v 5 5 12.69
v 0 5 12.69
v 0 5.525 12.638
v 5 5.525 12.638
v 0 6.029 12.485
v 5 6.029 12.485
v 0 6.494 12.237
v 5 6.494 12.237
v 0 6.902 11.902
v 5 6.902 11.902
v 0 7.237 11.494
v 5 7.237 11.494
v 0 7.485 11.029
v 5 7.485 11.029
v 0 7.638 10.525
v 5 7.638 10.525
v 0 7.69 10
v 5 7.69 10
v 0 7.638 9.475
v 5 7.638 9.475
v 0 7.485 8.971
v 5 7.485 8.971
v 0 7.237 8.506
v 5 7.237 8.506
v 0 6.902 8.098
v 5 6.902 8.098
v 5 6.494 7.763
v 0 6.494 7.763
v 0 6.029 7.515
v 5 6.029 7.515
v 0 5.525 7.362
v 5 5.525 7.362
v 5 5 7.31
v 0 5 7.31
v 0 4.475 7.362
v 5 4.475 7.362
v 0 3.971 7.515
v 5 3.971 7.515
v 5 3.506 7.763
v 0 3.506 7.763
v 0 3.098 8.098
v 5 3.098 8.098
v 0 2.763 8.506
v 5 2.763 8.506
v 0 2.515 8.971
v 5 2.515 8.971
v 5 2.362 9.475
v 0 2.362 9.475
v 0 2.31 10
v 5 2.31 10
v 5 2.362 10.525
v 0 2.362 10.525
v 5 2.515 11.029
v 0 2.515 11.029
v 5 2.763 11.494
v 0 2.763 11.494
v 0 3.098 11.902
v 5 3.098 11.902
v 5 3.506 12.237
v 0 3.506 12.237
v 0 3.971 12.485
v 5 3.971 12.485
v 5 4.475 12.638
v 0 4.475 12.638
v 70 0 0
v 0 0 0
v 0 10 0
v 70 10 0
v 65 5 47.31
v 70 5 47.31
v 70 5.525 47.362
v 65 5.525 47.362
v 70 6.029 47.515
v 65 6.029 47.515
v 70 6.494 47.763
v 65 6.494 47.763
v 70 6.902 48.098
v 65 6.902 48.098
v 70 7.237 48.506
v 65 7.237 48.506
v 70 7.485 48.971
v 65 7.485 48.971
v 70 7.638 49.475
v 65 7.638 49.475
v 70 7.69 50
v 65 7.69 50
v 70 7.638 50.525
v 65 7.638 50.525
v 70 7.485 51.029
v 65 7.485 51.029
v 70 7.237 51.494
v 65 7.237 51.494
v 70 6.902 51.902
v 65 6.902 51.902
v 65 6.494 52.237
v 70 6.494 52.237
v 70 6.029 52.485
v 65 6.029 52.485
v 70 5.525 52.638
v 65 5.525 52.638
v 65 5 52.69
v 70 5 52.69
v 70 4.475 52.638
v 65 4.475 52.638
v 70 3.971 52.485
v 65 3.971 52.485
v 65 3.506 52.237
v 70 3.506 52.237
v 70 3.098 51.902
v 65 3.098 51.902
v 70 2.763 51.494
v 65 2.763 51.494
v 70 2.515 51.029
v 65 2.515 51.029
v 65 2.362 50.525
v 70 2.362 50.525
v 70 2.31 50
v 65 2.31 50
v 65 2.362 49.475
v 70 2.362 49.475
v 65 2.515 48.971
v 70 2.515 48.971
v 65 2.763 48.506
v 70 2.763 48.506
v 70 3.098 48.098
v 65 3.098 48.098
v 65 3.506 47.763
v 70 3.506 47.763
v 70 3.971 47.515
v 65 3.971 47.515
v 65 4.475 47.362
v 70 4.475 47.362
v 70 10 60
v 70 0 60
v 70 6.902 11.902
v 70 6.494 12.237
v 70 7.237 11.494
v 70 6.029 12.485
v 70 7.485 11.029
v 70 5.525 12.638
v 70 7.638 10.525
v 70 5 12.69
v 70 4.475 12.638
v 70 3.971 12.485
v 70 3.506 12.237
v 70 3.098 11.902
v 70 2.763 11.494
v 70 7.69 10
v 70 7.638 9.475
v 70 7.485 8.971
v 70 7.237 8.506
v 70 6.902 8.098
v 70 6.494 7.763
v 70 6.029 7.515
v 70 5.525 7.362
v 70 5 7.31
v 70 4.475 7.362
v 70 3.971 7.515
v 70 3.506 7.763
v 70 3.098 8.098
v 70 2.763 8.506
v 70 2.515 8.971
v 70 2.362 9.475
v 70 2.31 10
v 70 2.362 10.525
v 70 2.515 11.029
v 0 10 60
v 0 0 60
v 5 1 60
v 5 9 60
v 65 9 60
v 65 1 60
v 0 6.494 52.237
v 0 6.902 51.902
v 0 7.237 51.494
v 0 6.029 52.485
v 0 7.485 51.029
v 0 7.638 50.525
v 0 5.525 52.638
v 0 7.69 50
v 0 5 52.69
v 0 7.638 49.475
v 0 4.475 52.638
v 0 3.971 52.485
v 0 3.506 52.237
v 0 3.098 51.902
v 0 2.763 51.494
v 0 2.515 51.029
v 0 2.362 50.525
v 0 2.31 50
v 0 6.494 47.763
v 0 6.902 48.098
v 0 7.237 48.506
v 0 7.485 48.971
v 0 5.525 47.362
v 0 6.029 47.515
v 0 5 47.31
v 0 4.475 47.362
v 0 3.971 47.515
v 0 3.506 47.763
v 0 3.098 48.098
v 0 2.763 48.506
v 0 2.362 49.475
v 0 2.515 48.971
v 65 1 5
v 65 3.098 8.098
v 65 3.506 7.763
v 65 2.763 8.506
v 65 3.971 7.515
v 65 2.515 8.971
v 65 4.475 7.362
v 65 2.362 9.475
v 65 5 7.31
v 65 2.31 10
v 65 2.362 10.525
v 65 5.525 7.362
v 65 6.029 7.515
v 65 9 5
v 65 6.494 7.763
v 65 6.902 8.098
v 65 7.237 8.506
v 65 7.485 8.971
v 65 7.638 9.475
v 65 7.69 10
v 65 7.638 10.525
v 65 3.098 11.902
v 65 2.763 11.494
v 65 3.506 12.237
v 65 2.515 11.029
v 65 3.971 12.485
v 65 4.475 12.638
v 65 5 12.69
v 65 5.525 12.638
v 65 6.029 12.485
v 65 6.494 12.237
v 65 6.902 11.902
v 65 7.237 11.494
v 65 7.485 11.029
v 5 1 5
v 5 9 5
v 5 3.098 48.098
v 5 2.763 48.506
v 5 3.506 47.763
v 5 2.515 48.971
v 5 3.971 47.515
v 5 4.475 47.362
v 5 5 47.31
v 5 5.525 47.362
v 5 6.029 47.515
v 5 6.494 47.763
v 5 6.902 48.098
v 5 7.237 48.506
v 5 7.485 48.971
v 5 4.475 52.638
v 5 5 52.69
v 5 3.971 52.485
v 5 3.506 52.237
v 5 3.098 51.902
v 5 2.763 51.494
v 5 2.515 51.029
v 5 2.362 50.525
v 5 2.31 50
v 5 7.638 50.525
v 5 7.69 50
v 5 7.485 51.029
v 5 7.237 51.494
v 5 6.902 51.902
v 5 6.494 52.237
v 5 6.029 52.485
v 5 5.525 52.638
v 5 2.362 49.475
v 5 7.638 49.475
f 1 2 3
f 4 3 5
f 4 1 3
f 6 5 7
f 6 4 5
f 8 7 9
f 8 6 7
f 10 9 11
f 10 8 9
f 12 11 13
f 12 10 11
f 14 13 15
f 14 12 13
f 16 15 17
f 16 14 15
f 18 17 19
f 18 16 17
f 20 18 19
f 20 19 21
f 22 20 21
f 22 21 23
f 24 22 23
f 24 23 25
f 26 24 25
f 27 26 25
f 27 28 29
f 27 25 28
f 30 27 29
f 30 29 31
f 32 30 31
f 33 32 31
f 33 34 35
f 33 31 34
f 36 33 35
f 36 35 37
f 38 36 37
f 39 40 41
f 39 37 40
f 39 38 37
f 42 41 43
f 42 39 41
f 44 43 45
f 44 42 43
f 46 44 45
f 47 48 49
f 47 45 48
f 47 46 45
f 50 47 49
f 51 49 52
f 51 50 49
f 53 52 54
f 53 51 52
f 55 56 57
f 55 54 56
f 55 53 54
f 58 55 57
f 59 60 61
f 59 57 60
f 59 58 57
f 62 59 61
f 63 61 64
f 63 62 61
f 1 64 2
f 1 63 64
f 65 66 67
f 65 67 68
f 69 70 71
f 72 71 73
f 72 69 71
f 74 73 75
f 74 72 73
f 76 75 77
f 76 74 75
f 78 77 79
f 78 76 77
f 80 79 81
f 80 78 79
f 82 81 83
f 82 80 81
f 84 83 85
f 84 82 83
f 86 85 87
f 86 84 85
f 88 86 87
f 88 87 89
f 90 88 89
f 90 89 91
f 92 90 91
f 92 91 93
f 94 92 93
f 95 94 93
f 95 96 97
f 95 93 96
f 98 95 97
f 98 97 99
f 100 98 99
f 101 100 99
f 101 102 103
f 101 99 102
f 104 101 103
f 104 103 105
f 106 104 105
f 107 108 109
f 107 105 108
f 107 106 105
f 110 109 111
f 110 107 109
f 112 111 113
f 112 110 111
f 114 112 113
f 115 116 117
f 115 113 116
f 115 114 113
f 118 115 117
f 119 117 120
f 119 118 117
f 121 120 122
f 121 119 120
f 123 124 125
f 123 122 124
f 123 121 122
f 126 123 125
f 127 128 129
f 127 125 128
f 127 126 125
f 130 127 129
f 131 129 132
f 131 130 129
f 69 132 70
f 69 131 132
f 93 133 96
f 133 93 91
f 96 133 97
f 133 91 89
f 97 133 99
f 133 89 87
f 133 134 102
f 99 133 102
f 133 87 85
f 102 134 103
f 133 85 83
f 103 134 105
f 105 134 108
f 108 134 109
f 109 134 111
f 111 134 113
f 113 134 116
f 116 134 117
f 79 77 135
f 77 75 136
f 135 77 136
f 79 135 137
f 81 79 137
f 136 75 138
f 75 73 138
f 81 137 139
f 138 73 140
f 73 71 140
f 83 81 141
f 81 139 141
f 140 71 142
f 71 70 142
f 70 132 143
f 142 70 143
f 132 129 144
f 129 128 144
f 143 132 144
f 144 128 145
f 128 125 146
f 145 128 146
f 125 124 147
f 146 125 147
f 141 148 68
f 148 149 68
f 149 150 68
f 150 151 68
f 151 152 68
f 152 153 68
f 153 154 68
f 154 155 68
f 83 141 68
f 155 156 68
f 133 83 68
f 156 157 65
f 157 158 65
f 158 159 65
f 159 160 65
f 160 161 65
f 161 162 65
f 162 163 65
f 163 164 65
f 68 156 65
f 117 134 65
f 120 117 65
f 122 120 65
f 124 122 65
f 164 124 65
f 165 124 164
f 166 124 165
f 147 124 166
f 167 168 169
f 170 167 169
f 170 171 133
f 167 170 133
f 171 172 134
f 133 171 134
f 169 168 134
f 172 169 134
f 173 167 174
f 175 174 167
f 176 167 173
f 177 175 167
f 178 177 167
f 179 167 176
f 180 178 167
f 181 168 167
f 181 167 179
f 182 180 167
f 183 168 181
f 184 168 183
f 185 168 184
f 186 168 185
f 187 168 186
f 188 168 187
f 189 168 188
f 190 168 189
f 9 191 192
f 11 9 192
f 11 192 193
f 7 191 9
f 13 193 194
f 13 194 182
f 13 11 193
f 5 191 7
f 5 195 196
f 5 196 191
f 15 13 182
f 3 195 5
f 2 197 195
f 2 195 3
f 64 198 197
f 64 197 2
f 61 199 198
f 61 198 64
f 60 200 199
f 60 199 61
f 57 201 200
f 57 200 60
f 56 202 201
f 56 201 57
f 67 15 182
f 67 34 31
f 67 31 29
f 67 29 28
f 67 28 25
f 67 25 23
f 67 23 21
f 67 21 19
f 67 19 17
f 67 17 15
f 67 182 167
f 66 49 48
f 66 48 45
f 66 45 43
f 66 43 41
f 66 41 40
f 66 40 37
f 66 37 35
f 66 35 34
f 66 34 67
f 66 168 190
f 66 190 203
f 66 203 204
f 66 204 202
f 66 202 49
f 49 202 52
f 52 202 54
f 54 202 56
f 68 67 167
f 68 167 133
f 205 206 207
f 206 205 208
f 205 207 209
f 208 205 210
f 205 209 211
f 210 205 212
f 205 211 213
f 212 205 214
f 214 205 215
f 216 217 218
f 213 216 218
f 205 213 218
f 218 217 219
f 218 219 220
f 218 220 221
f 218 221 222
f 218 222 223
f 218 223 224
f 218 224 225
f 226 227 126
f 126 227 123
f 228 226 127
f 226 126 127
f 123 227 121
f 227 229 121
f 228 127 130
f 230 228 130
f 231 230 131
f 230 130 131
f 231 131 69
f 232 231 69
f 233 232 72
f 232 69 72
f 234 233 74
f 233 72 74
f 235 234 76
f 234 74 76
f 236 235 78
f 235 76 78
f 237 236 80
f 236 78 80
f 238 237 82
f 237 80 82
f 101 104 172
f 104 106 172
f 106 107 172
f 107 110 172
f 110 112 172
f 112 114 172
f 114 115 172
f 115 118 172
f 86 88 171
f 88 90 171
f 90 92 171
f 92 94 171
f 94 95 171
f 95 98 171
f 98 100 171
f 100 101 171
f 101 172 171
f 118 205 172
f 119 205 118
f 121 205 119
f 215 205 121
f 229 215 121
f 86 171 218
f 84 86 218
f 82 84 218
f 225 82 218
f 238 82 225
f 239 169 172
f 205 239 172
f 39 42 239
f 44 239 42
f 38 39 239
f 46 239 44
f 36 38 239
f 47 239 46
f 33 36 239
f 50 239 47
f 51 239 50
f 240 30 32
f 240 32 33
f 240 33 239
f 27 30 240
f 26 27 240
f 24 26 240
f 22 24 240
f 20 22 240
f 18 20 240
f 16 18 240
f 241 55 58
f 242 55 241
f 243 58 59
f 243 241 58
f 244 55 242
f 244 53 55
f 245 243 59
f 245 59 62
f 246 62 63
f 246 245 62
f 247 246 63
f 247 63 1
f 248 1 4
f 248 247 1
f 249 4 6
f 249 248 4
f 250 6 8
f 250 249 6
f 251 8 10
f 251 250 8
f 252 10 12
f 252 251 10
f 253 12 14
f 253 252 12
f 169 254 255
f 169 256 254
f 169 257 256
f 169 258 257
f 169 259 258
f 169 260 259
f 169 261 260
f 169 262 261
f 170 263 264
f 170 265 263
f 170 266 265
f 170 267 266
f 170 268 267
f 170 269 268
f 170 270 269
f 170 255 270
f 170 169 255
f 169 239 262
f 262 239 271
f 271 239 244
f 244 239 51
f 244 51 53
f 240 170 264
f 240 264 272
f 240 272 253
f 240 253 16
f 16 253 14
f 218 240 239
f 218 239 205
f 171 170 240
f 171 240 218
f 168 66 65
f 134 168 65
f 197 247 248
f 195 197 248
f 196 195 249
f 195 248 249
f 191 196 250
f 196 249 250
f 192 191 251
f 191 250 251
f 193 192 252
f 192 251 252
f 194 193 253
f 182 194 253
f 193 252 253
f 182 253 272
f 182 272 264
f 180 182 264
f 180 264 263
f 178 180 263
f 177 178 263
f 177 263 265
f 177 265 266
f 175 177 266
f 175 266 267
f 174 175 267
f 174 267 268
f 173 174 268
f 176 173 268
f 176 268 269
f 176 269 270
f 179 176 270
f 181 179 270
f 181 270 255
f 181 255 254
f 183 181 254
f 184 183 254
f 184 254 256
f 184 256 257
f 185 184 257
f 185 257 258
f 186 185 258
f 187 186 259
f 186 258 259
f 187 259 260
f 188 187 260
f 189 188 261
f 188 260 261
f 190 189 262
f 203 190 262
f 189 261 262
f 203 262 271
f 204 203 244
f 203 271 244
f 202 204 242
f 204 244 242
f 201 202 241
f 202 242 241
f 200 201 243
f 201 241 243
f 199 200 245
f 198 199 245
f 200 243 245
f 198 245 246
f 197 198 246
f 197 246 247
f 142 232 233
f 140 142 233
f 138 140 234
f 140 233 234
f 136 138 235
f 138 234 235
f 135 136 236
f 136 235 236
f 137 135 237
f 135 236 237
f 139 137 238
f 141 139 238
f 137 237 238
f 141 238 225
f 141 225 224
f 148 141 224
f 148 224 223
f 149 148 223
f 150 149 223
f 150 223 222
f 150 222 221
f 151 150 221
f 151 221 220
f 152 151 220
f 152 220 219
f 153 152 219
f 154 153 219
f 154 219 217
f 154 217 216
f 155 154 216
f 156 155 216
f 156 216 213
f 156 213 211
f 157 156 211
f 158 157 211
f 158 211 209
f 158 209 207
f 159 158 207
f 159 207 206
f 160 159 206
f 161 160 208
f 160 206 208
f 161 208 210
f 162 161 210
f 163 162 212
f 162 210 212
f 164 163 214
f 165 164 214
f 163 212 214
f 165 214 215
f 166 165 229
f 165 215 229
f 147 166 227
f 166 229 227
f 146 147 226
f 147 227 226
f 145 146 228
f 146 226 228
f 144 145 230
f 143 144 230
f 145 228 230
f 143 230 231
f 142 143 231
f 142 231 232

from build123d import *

# Parameters (mm, degrees)
SKETCH1_W               = 70
SKETCH1_H               = 60
BOSS_EXTRUDE1_DEPTH     = 10
SKETCH2_W               = 60
SKETCH2_H               = 8
CUT_EXTRUDE1_DEPTH      = 55
SKETCH3_R               = 2.68983582
CUT_EXTRUDE2_DEPTH      = 55
MIRROR2_COPY_1_SKETCH_R = 2.68983582
MIRROR2_COPY_1_DEPTH    = 55


with BuildPart() as part:
    # Sketch1 → Boss-Extrude1 (new body)
    with BuildSketch(Plane(origin=(0, 0, 0), x_dir=(1, 0, 0), z_dir=(0, 1, 0))):
        with Locations((35, -30)):
            Rectangle(SKETCH1_W, SKETCH1_H)
    extrude(amount=BOSS_EXTRUDE1_DEPTH)

    # Sketch2 → Cut-Extrude1 (cut)
    with BuildSketch(Plane.XY.offset(60)):
        with Locations((35, 5)):
            Rectangle(SKETCH2_W, SKETCH2_H)
    extrude(amount=-CUT_EXTRUDE1_DEPTH, mode=Mode.SUBTRACT)

    # Sketch3 → Cut-Extrude2 (cut)
    with BuildSketch(Plane.ZY.offset(-65)):
        with Locations((10, 5)):
            Circle(SKETCH3_R)
    cut_extrude2 = extrude(amount=-CUT_EXTRUDE2_DEPTH, mode=Mode.SUBTRACT)

    # Mirror1: Cut-Extrude2 across plane
    add(cut_extrude2.mirror(Plane.ZY.offset(-35)), mode=Mode.SUBTRACT)

    # Mirror2: Cut-Extrude2 across plane
    add(cut_extrude2.mirror(Plane.XY.offset(30)), mode=Mode.SUBTRACT)

    # Mirror2 copy 1 sketch → Mirror2 copy 1 (cut)
    with BuildSketch(Plane(origin=(5, 0, 60), x_dir=(0, 0, -1), z_dir=(1, 0, 0))):
        with Locations((10, 5)):
            Circle(MIRROR2_COPY_1_SKETCH_R)
    extrude(amount=-MIRROR2_COPY_1_DEPTH, mode=Mode.SUBTRACT)


solid = part.part
